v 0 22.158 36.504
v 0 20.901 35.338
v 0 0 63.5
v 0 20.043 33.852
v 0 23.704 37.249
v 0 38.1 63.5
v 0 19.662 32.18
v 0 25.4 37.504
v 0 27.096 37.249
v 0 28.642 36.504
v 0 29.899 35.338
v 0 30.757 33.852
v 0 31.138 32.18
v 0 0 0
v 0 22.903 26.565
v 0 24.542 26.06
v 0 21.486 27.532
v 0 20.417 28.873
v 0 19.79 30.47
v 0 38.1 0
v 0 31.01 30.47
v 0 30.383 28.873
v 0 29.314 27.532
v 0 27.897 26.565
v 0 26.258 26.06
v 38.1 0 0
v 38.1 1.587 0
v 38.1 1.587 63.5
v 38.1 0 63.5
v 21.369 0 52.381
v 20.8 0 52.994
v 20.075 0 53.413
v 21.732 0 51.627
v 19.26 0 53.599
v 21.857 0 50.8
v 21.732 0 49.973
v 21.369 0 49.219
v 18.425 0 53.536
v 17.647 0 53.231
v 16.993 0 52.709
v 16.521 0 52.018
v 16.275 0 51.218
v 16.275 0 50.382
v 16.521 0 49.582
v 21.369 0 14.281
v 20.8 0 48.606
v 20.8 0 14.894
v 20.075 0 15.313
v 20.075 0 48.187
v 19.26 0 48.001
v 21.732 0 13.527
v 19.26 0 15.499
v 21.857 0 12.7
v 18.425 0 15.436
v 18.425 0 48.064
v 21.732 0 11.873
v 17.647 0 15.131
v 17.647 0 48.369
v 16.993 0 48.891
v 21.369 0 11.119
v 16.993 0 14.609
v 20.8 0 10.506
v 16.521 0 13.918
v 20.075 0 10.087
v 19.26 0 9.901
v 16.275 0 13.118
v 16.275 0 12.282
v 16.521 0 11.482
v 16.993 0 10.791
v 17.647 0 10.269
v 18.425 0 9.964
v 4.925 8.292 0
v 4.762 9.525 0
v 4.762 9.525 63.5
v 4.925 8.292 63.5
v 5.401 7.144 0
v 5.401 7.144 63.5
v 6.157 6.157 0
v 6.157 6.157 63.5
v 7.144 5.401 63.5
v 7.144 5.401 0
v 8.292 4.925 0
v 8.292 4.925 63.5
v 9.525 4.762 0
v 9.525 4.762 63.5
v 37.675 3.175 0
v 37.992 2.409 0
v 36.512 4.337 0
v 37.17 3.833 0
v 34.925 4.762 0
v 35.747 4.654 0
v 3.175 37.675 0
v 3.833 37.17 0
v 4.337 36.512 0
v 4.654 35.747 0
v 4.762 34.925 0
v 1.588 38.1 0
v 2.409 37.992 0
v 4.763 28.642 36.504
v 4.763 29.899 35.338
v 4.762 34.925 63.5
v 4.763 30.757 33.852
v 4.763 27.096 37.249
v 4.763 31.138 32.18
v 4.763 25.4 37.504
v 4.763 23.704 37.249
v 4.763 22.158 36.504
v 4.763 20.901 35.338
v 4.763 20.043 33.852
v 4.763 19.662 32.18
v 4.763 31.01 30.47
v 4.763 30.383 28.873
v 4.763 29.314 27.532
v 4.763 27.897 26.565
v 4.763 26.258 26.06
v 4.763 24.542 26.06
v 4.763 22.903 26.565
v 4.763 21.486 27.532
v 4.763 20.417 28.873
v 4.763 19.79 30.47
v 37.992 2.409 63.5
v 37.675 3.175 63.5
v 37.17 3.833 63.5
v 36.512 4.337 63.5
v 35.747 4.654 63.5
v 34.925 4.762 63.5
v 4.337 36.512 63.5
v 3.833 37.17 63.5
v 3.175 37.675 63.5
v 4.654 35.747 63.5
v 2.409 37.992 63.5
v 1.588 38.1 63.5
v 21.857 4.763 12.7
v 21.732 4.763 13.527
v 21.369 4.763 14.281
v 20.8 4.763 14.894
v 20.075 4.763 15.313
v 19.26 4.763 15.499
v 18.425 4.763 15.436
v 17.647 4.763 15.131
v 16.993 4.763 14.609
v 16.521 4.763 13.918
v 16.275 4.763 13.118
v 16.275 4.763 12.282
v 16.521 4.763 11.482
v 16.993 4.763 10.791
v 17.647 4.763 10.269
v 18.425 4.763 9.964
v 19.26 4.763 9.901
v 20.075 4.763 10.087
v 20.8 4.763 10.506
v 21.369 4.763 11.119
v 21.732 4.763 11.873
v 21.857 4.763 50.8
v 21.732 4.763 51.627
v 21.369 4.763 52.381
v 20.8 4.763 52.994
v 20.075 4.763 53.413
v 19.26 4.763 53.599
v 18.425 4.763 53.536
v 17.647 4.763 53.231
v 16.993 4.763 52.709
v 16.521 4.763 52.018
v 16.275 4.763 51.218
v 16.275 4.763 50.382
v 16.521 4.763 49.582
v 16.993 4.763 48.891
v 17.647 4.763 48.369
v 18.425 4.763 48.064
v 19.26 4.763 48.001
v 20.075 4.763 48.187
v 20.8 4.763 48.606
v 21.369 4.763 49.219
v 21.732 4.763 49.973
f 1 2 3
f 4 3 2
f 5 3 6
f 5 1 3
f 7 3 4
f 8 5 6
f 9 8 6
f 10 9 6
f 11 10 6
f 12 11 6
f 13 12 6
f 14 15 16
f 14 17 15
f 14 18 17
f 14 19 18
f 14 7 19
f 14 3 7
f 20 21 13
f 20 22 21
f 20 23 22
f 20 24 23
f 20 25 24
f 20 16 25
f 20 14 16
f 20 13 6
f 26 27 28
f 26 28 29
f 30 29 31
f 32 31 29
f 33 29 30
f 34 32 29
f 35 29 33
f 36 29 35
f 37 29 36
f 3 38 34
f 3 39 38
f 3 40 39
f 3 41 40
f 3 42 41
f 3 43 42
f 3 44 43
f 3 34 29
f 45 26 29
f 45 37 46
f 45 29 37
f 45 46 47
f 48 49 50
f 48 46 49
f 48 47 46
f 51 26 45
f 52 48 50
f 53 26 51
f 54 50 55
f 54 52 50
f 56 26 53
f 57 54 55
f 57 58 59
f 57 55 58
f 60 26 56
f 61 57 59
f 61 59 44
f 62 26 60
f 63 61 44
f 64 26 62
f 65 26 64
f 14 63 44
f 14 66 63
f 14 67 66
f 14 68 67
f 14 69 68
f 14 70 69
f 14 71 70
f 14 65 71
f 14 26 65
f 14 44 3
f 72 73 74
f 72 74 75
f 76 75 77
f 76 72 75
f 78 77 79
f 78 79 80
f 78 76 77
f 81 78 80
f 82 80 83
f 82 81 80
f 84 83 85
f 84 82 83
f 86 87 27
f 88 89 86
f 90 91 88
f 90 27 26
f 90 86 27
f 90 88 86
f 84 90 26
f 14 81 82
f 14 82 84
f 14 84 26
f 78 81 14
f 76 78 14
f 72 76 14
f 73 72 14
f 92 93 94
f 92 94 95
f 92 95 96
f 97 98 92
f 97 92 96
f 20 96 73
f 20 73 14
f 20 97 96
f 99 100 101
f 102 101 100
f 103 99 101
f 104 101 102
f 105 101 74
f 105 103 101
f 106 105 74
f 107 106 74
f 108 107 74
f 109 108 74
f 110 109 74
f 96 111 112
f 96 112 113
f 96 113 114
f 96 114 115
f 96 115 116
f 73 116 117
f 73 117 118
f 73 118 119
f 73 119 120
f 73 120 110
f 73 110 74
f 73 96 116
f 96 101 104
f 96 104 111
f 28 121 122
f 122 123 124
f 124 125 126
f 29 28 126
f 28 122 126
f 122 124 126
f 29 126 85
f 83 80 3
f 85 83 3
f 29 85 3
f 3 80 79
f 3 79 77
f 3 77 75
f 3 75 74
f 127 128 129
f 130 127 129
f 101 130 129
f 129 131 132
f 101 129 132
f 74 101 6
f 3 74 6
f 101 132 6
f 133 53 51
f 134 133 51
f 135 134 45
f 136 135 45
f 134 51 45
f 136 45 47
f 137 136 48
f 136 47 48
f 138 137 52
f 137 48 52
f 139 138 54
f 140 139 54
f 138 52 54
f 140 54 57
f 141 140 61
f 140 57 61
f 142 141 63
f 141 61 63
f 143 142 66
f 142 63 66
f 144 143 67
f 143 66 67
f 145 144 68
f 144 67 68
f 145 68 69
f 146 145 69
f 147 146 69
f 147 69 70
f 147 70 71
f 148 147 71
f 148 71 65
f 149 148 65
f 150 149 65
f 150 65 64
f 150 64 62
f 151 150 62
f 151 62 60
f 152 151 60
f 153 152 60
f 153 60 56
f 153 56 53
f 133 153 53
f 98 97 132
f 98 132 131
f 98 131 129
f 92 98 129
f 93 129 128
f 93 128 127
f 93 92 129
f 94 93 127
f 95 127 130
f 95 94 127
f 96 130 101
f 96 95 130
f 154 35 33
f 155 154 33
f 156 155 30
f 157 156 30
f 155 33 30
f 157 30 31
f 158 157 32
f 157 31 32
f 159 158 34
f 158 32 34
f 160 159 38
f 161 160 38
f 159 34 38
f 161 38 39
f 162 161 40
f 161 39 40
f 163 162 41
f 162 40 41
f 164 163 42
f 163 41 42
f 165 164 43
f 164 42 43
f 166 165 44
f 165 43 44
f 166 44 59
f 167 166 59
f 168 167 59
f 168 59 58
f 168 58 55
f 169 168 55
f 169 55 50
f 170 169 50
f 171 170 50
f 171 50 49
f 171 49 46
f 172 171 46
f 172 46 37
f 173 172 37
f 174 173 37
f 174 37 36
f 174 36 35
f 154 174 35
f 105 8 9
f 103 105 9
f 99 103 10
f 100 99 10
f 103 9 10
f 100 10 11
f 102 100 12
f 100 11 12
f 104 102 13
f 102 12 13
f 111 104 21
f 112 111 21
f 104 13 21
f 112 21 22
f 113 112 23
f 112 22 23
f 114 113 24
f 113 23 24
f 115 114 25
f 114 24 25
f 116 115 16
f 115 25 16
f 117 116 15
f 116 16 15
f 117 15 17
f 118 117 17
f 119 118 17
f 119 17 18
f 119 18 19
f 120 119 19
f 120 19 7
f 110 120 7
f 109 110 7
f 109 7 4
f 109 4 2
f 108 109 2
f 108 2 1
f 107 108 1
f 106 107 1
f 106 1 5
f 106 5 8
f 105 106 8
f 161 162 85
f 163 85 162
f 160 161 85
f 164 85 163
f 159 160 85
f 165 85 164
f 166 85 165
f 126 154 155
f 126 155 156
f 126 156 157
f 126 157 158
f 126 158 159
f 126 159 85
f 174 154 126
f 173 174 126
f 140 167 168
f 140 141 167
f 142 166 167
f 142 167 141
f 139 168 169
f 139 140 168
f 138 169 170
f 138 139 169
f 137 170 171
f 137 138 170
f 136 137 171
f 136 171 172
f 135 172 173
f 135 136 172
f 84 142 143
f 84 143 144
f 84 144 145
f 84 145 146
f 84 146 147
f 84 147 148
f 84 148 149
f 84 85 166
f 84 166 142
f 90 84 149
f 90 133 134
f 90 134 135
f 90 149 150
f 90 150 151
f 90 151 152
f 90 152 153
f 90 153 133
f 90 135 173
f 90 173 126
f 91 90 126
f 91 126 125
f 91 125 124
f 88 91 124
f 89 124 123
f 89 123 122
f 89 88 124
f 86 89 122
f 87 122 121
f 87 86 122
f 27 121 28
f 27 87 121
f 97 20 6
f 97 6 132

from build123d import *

# Parameters (mm, degrees)
EXTRUDE1_DEPTH           = 63.5
F_10_CLEARANCE_HOLE1_D   = 5.6134
F_7_16_CLEARANCE_HOLE1_D = 11.50874


with BuildPart() as part:
    # Sketch1 → Extrude1 (new body)
    with BuildSketch(Plane.XY):
        with BuildLine():
            Line((0, 0), (0, 38.1))
            Line((0, 38.1), (1.5875, 38.1))
            ThreePointArc((1.5875, 38.1), (3.83256403, 37.17006403), (4.7625, 34.925))
            Line((4.7625, 34.925), (4.7625, 9.525))
            ThreePointArc((4.7625, 9.525), (6.157403955, 6.157403955), (9.525, 4.7625))
            Line((9.525, 4.7625), (34.925, 4.7625))
            ThreePointArc((34.925, 4.7625), (37.17006403, 3.83256403), (38.1, 1.5875))
            Line((38.1, 1.5875), (38.1, 0))
            Line((38.1, 0), (0, 0))
        make_face()
    extrude(amount=EXTRUDE1_DEPTH)

    # #10 Clearance Hole1 (through all)
    with Locations(Plane(origin=(0, 4.7625, 0), x_dir=(-1, 0, 0), z_dir=(0, 1, 0))):
        with Locations((-19.05, 50.8), (-19.05, 12.7)):
            Hole(F_10_CLEARANCE_HOLE1_D / 2)

    # 7/16 Clearance Hole1 (through all)
    with Locations(Plane(origin=(4.7625, 0, 0), x_dir=(0, 0, -1), z_dir=(1, 0, 0))):
        with Locations((-31.75, 25.4)):
            Hole(F_7_16_CLEARANCE_HOLE1_D / 2)


solid = part.part
